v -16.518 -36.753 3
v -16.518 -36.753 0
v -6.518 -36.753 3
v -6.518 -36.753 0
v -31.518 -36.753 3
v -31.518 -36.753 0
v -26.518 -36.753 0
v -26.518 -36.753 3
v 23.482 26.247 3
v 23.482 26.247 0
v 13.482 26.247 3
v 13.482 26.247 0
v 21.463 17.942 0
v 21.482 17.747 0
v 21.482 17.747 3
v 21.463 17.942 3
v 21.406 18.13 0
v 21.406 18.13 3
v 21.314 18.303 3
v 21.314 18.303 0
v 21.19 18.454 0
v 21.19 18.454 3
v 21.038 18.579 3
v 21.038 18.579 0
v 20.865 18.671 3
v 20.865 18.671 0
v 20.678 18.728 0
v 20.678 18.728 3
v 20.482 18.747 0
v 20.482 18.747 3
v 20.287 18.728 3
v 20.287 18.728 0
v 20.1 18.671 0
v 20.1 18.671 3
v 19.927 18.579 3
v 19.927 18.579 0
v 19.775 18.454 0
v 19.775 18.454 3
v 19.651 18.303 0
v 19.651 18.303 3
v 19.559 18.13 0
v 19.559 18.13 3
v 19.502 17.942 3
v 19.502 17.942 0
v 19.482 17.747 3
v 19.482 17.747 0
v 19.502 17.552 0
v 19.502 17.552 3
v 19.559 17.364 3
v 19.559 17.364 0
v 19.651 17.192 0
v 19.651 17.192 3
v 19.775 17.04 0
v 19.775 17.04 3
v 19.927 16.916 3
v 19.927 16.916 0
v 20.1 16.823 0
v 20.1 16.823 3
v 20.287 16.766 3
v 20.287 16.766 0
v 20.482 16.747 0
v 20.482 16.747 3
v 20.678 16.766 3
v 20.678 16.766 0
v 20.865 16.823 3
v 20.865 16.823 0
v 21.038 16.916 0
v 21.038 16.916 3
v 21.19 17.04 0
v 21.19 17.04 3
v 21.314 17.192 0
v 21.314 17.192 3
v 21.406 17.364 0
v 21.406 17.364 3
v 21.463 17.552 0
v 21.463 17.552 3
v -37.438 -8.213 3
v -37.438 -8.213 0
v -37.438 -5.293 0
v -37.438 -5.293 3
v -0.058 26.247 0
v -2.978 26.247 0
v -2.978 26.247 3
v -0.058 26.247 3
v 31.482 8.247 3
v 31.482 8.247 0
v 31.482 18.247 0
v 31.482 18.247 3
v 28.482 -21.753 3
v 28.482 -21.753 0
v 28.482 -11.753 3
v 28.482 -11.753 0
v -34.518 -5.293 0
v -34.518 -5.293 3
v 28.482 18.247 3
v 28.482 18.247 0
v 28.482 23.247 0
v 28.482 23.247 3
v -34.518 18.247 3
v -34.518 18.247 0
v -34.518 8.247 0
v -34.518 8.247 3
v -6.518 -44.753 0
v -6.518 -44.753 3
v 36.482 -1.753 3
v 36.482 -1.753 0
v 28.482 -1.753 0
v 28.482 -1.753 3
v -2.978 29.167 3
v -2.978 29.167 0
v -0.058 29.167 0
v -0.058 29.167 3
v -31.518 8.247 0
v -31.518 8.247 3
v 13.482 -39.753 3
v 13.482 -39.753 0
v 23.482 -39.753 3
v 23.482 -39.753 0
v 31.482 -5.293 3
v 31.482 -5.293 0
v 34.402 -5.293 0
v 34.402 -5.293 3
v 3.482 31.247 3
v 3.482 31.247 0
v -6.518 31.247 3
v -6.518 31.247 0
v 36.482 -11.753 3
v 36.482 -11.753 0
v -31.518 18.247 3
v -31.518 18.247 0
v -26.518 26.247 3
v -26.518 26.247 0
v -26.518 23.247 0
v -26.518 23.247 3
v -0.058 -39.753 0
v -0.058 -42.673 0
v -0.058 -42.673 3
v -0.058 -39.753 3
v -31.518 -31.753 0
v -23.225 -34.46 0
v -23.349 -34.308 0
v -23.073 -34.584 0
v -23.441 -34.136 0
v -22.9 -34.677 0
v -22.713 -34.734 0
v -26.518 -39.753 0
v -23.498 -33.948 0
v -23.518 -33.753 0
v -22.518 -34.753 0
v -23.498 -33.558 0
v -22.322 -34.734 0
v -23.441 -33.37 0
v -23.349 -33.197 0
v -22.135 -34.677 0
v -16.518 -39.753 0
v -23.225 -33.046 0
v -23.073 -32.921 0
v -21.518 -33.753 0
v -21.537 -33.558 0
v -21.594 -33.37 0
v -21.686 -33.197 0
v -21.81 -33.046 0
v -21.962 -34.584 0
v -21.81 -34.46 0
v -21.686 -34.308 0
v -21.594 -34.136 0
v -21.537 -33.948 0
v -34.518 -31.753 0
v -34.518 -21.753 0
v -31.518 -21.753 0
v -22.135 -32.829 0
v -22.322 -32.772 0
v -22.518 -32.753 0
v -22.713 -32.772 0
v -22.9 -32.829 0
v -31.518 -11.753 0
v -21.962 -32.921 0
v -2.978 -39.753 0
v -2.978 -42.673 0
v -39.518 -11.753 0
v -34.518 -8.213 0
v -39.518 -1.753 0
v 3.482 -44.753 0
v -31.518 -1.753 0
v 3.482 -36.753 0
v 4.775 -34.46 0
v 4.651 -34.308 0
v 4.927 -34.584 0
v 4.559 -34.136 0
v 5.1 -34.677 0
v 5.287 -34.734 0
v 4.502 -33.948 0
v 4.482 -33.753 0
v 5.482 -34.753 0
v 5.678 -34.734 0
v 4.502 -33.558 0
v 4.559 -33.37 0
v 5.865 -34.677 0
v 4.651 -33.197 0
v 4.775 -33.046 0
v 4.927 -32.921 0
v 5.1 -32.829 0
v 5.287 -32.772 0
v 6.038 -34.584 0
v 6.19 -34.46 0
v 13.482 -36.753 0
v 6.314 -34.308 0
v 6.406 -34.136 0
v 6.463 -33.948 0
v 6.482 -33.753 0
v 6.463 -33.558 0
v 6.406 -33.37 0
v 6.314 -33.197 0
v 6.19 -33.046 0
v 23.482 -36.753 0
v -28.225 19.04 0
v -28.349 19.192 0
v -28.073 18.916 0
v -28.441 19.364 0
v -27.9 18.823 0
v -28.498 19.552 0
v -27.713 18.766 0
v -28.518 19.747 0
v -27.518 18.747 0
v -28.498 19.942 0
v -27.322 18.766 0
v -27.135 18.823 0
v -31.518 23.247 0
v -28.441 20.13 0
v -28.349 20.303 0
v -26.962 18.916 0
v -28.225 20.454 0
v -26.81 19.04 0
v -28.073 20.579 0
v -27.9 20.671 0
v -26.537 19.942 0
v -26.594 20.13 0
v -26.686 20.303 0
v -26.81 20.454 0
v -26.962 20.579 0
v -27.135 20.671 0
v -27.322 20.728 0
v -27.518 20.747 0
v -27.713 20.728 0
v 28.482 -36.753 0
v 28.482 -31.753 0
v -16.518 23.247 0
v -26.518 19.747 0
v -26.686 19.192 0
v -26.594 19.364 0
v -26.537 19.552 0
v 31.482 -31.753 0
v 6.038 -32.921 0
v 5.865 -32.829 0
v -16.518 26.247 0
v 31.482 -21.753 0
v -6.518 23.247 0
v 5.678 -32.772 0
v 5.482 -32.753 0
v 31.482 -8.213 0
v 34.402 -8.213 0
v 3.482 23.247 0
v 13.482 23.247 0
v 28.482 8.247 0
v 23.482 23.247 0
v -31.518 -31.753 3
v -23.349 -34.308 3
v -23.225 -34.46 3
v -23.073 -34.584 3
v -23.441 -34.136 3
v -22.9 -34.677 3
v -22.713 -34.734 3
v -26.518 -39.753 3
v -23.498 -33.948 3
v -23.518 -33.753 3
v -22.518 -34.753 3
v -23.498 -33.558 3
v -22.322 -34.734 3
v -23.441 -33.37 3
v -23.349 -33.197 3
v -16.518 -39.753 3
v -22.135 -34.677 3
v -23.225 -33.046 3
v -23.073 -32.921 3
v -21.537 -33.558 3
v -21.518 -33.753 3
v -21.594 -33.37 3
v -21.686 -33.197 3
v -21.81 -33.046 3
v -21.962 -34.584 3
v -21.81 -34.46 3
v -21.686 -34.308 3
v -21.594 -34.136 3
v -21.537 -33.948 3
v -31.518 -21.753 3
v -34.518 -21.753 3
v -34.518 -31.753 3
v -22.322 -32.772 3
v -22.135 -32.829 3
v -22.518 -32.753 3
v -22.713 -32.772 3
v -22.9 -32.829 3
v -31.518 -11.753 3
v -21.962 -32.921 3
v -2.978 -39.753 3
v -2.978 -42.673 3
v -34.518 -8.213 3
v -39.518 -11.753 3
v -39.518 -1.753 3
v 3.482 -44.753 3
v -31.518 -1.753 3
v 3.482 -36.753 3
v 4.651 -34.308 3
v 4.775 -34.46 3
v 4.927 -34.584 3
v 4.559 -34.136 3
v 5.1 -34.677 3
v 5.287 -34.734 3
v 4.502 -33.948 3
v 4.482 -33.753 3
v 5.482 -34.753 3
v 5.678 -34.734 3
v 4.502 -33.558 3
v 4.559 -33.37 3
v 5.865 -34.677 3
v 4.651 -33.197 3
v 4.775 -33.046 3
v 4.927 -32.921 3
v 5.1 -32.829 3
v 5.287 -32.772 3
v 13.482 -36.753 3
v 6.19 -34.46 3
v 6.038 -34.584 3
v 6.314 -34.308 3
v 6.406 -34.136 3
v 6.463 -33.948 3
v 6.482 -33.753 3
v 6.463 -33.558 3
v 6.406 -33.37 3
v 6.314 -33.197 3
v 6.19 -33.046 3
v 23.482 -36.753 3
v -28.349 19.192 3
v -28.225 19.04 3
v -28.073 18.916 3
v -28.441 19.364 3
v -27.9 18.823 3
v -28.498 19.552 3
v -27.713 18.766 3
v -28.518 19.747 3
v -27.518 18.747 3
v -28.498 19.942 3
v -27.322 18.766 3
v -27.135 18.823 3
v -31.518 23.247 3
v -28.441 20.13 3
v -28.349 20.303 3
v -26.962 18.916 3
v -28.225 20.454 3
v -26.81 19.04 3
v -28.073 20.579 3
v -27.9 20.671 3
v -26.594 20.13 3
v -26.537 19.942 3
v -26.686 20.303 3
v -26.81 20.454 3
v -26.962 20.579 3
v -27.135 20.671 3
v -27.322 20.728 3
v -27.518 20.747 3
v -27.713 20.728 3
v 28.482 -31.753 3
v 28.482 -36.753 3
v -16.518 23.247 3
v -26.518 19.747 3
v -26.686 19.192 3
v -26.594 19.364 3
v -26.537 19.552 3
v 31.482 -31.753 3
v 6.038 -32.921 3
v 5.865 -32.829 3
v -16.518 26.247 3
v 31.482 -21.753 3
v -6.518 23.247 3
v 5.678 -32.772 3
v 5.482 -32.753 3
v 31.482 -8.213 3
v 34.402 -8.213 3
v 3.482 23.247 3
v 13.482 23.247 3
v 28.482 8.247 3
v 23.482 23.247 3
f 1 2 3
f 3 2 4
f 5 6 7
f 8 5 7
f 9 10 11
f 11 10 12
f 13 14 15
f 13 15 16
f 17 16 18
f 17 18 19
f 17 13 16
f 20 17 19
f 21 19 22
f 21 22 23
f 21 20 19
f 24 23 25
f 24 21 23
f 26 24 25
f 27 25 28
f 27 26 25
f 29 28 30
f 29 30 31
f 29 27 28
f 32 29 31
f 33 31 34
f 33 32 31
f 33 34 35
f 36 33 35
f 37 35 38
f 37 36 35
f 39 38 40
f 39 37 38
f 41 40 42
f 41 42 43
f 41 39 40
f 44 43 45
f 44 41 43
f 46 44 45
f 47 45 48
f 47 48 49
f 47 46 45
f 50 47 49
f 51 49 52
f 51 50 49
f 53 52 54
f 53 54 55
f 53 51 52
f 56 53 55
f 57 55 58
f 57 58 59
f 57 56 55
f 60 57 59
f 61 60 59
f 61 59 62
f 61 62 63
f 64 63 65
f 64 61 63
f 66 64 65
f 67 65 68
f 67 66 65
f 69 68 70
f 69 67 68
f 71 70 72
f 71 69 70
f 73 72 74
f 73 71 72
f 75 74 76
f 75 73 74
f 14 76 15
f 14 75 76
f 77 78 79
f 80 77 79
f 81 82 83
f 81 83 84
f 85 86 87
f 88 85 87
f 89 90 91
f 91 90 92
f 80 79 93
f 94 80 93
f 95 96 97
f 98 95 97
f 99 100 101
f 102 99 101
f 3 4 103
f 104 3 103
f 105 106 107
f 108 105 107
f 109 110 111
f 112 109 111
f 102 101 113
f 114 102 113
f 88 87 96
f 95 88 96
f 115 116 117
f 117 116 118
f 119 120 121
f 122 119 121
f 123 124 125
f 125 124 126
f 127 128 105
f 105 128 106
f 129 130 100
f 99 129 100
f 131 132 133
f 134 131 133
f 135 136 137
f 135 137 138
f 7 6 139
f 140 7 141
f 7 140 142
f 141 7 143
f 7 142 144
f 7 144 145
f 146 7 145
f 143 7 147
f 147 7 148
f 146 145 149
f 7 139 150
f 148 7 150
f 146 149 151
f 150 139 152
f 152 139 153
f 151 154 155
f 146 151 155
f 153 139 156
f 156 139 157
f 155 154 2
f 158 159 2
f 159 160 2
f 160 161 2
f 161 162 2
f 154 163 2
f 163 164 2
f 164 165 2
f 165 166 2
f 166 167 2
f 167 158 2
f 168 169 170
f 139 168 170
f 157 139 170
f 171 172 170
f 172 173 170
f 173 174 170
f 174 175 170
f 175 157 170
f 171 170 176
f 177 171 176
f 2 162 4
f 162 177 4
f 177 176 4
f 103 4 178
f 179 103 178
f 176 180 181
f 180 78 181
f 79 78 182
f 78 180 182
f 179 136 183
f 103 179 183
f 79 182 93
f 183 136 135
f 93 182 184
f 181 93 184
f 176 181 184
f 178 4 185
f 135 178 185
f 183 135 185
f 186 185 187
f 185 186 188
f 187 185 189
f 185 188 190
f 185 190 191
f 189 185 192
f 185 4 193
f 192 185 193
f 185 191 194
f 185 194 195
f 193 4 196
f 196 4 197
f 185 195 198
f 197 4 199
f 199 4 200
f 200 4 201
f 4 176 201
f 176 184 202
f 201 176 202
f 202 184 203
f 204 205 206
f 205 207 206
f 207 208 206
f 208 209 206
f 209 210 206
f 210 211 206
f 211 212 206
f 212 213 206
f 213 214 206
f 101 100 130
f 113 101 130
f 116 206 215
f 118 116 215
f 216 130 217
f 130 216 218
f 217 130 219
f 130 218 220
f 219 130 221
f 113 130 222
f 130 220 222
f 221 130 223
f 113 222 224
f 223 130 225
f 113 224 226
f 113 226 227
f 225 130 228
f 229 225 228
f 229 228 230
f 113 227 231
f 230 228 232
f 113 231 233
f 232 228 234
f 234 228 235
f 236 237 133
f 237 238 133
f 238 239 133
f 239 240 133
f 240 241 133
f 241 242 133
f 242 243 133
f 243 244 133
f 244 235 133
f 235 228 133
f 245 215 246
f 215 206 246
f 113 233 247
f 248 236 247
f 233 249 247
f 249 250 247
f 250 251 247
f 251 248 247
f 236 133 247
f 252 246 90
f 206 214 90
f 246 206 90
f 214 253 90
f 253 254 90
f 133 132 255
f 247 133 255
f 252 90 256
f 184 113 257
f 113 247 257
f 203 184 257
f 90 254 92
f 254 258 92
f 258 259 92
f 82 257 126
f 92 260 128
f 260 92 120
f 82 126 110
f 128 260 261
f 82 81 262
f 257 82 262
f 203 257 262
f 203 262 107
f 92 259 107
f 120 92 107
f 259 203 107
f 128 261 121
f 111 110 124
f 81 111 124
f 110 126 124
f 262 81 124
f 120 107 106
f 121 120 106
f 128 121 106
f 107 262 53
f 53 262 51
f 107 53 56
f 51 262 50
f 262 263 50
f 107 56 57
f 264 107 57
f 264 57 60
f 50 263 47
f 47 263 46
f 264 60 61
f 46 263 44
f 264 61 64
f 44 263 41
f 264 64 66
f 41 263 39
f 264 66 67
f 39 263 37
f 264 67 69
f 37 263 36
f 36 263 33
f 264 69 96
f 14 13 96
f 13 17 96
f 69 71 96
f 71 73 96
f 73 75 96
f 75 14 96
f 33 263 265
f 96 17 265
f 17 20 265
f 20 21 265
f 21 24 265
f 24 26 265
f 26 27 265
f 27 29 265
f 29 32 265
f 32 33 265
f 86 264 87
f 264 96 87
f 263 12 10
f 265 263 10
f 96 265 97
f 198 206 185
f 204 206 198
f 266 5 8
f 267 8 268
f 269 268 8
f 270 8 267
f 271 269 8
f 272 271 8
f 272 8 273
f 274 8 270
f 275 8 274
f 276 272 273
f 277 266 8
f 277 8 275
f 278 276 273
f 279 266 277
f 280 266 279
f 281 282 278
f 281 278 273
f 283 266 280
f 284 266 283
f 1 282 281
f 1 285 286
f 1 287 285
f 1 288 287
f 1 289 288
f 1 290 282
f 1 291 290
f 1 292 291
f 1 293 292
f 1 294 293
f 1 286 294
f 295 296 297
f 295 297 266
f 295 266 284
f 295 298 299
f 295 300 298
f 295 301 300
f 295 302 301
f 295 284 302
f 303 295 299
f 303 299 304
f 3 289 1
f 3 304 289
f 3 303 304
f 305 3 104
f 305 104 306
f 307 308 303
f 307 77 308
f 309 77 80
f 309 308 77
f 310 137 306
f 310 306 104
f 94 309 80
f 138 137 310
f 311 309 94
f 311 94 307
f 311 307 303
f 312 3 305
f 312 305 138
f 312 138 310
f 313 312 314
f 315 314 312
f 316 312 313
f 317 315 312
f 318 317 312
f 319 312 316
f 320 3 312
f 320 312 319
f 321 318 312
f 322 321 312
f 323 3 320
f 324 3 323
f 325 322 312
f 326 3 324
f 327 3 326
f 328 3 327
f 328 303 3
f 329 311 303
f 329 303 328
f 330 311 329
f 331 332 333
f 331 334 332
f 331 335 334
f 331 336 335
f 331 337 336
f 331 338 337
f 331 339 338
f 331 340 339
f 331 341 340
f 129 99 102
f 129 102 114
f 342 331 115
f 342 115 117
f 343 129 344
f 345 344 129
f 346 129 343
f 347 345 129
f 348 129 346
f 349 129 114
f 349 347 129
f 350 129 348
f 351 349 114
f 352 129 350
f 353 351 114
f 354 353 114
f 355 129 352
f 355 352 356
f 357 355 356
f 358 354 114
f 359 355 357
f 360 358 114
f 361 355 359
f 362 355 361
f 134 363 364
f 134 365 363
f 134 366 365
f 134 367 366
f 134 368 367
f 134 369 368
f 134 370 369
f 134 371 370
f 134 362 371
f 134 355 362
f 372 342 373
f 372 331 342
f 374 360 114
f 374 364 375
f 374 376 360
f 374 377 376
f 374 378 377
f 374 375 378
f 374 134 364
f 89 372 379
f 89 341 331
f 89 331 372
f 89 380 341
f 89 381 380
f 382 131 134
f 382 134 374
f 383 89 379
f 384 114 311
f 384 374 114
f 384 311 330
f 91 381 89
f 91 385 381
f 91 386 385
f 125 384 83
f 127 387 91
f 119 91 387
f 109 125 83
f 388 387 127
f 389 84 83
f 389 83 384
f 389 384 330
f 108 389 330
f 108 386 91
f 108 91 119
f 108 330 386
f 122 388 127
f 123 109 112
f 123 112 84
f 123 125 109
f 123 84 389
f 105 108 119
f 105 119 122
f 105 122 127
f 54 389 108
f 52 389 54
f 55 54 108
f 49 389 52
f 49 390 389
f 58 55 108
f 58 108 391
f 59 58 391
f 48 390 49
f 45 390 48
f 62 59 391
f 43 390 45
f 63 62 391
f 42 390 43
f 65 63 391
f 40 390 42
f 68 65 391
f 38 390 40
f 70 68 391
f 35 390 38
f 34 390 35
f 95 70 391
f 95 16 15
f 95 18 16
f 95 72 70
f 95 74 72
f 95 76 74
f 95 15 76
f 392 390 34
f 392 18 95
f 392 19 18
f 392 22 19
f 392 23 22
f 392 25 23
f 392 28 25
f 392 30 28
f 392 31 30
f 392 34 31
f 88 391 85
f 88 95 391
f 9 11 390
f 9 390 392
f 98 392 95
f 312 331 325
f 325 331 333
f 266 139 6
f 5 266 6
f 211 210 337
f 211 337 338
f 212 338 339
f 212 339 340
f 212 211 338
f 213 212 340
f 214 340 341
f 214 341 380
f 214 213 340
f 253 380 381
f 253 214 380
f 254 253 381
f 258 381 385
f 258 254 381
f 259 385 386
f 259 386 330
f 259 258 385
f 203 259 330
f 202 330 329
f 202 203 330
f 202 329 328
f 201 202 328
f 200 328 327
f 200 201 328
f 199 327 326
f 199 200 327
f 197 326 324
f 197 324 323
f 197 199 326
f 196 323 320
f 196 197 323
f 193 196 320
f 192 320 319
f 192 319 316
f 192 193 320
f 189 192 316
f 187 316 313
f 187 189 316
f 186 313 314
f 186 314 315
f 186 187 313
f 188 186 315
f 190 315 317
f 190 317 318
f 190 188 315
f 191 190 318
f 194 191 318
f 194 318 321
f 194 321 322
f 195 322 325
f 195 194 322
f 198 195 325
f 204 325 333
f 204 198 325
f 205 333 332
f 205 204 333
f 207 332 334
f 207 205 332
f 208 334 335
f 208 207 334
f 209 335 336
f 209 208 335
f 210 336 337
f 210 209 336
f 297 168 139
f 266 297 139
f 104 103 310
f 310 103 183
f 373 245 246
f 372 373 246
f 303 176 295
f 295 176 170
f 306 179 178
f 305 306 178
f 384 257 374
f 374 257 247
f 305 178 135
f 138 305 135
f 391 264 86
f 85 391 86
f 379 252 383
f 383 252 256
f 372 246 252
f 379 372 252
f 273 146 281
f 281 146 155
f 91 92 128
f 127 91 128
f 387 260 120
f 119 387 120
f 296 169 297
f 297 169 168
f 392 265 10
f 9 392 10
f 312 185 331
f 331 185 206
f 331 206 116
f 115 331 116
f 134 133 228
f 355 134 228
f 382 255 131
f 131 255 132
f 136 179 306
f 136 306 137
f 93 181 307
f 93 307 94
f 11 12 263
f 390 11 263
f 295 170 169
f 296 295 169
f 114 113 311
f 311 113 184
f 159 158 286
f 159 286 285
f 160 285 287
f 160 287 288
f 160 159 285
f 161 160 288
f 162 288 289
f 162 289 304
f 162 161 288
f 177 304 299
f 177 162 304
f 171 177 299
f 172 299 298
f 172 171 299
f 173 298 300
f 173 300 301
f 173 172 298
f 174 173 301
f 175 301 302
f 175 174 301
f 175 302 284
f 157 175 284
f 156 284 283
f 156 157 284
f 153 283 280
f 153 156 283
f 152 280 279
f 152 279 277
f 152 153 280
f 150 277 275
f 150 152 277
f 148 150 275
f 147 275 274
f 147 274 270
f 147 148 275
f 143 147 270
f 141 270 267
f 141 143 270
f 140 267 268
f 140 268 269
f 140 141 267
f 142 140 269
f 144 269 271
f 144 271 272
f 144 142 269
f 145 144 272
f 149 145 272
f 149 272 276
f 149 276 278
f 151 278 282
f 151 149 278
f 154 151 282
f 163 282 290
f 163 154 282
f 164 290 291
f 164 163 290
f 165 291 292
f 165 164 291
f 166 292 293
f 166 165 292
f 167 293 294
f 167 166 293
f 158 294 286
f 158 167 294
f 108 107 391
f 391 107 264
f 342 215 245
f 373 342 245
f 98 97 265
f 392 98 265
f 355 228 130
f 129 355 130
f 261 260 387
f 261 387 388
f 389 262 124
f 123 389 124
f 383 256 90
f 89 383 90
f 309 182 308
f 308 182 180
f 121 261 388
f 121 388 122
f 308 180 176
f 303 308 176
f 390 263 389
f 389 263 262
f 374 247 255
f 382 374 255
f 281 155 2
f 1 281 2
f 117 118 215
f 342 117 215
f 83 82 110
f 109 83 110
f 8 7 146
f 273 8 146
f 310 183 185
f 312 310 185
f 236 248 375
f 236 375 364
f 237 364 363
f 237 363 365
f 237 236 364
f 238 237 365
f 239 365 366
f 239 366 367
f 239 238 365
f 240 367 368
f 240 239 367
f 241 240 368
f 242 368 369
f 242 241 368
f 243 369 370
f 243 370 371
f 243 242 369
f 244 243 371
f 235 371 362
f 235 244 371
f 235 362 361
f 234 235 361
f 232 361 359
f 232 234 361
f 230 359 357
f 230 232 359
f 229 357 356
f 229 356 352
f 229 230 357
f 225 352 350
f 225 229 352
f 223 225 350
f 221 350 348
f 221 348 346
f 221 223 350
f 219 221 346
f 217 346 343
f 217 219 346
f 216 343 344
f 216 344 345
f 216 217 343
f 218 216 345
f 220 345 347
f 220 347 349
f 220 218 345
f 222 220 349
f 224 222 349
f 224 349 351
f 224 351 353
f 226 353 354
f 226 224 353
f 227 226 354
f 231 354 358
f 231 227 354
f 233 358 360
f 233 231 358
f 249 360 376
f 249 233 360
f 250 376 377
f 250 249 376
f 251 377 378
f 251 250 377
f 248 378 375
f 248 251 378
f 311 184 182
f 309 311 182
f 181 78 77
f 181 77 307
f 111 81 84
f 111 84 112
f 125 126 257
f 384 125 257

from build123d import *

# Parameters (mm, degrees)
SKETCH1_R           = 1
SKETCH1_W           = 2.92
SKETCH1_H           = 2.92
BOSS_EXTRUDE1_DEPTH = 3


with BuildPart() as part:
    # Sketch1 → Boss-Extrude1 (new body)
    with BuildSketch(Plane.XY):
        Polygon((-16.517509728, 23.247171726), (-16.517509728, 26.247171726), (-26.517509728, 26.247171726), (-26.517509728, 23.247171726), (-31.517509728, 23.247171726), (-31.517509728, 18.247171726), (-34.517509728, 18.247171726), (-34.517509728, 8.247171726), (-31.517509728, 8.247171726), (-31.517509728, -1.752828274), (-39.517509728, -1.752828274), (-39.517509728, -11.752828274), (-31.517509728, -11.752828274), (-31.517509728, -21.752828274), (-34.517509728, -21.752828274), (-34.517509728, -31.752828274), (-31.517509728, -31.752828274), (-31.517509728, -36.752828274), (-26.517509728, -36.752828274), (-26.517509728, -39.752828274), (-16.517509728, -39.752828274), (-16.517509728, -36.752828274), (-6.517509728, -36.752828274), (-6.517509728, -44.752828274), (3.482490272, -44.752828274), (3.482490272, -36.752828274), (13.482490272, -36.752828274), (13.482490272, -39.752828274), (23.482490272, -39.752828274), (23.482490272, -36.752828274), (28.482490272, -36.752828274), (28.482490272, -31.752828274), (31.482490272, -31.752828274), (31.482490272, -21.752828274), (28.482490272, -21.752828274), (28.482490272, -11.752828274), (36.482490272, -11.752828274), (36.482490272, -1.752828274), (28.482490272, -1.752828274), (28.482490272, 8.247171726), (31.482490272, 8.247171726), (31.482490272, 18.247171726), (28.482490272, 18.247171726), (28.482490272, 23.247171726), (23.482490272, 23.247171726), (23.482490272, 26.247171726), (13.482490272, 26.247171726), (13.482490272, 23.247171726), (3.482490272, 23.247171726), (3.482490272, 31.247171726), (-6.517509728, 31.247171726), (-6.517509728, 23.247171726), align=None)
        with Locations((-22.517509728, -33.752828274)):
            Circle(SKETCH1_R, mode=Mode.SUBTRACT)
        with Locations((5.482490272, -33.752828274)):
            Circle(SKETCH1_R, mode=Mode.SUBTRACT)
        with Locations((-27.517509728, 19.747171726)):
            Circle(SKETCH1_R, mode=Mode.SUBTRACT)
        with Locations((20.482490272, 17.747171726)):
            Circle(SKETCH1_R, mode=Mode.SUBTRACT)
        with Locations((-1.517509728, 27.707171726)):
            Rectangle(SKETCH1_W, SKETCH1_H, mode=Mode.SUBTRACT)
        with Locations((-35.977509728, -6.752828274)):
            Rectangle(SKETCH1_W, SKETCH1_H, mode=Mode.SUBTRACT)
        with Locations((32.942490272, -6.752828274)):
            Rectangle(SKETCH1_W, SKETCH1_H, mode=Mode.SUBTRACT)
        with Locations((-1.517509728, -41.212828274)):
            Rectangle(SKETCH1_W, SKETCH1_H, mode=Mode.SUBTRACT)
    extrude(amount=BOSS_EXTRUDE1_DEPTH)


solid = part.part
